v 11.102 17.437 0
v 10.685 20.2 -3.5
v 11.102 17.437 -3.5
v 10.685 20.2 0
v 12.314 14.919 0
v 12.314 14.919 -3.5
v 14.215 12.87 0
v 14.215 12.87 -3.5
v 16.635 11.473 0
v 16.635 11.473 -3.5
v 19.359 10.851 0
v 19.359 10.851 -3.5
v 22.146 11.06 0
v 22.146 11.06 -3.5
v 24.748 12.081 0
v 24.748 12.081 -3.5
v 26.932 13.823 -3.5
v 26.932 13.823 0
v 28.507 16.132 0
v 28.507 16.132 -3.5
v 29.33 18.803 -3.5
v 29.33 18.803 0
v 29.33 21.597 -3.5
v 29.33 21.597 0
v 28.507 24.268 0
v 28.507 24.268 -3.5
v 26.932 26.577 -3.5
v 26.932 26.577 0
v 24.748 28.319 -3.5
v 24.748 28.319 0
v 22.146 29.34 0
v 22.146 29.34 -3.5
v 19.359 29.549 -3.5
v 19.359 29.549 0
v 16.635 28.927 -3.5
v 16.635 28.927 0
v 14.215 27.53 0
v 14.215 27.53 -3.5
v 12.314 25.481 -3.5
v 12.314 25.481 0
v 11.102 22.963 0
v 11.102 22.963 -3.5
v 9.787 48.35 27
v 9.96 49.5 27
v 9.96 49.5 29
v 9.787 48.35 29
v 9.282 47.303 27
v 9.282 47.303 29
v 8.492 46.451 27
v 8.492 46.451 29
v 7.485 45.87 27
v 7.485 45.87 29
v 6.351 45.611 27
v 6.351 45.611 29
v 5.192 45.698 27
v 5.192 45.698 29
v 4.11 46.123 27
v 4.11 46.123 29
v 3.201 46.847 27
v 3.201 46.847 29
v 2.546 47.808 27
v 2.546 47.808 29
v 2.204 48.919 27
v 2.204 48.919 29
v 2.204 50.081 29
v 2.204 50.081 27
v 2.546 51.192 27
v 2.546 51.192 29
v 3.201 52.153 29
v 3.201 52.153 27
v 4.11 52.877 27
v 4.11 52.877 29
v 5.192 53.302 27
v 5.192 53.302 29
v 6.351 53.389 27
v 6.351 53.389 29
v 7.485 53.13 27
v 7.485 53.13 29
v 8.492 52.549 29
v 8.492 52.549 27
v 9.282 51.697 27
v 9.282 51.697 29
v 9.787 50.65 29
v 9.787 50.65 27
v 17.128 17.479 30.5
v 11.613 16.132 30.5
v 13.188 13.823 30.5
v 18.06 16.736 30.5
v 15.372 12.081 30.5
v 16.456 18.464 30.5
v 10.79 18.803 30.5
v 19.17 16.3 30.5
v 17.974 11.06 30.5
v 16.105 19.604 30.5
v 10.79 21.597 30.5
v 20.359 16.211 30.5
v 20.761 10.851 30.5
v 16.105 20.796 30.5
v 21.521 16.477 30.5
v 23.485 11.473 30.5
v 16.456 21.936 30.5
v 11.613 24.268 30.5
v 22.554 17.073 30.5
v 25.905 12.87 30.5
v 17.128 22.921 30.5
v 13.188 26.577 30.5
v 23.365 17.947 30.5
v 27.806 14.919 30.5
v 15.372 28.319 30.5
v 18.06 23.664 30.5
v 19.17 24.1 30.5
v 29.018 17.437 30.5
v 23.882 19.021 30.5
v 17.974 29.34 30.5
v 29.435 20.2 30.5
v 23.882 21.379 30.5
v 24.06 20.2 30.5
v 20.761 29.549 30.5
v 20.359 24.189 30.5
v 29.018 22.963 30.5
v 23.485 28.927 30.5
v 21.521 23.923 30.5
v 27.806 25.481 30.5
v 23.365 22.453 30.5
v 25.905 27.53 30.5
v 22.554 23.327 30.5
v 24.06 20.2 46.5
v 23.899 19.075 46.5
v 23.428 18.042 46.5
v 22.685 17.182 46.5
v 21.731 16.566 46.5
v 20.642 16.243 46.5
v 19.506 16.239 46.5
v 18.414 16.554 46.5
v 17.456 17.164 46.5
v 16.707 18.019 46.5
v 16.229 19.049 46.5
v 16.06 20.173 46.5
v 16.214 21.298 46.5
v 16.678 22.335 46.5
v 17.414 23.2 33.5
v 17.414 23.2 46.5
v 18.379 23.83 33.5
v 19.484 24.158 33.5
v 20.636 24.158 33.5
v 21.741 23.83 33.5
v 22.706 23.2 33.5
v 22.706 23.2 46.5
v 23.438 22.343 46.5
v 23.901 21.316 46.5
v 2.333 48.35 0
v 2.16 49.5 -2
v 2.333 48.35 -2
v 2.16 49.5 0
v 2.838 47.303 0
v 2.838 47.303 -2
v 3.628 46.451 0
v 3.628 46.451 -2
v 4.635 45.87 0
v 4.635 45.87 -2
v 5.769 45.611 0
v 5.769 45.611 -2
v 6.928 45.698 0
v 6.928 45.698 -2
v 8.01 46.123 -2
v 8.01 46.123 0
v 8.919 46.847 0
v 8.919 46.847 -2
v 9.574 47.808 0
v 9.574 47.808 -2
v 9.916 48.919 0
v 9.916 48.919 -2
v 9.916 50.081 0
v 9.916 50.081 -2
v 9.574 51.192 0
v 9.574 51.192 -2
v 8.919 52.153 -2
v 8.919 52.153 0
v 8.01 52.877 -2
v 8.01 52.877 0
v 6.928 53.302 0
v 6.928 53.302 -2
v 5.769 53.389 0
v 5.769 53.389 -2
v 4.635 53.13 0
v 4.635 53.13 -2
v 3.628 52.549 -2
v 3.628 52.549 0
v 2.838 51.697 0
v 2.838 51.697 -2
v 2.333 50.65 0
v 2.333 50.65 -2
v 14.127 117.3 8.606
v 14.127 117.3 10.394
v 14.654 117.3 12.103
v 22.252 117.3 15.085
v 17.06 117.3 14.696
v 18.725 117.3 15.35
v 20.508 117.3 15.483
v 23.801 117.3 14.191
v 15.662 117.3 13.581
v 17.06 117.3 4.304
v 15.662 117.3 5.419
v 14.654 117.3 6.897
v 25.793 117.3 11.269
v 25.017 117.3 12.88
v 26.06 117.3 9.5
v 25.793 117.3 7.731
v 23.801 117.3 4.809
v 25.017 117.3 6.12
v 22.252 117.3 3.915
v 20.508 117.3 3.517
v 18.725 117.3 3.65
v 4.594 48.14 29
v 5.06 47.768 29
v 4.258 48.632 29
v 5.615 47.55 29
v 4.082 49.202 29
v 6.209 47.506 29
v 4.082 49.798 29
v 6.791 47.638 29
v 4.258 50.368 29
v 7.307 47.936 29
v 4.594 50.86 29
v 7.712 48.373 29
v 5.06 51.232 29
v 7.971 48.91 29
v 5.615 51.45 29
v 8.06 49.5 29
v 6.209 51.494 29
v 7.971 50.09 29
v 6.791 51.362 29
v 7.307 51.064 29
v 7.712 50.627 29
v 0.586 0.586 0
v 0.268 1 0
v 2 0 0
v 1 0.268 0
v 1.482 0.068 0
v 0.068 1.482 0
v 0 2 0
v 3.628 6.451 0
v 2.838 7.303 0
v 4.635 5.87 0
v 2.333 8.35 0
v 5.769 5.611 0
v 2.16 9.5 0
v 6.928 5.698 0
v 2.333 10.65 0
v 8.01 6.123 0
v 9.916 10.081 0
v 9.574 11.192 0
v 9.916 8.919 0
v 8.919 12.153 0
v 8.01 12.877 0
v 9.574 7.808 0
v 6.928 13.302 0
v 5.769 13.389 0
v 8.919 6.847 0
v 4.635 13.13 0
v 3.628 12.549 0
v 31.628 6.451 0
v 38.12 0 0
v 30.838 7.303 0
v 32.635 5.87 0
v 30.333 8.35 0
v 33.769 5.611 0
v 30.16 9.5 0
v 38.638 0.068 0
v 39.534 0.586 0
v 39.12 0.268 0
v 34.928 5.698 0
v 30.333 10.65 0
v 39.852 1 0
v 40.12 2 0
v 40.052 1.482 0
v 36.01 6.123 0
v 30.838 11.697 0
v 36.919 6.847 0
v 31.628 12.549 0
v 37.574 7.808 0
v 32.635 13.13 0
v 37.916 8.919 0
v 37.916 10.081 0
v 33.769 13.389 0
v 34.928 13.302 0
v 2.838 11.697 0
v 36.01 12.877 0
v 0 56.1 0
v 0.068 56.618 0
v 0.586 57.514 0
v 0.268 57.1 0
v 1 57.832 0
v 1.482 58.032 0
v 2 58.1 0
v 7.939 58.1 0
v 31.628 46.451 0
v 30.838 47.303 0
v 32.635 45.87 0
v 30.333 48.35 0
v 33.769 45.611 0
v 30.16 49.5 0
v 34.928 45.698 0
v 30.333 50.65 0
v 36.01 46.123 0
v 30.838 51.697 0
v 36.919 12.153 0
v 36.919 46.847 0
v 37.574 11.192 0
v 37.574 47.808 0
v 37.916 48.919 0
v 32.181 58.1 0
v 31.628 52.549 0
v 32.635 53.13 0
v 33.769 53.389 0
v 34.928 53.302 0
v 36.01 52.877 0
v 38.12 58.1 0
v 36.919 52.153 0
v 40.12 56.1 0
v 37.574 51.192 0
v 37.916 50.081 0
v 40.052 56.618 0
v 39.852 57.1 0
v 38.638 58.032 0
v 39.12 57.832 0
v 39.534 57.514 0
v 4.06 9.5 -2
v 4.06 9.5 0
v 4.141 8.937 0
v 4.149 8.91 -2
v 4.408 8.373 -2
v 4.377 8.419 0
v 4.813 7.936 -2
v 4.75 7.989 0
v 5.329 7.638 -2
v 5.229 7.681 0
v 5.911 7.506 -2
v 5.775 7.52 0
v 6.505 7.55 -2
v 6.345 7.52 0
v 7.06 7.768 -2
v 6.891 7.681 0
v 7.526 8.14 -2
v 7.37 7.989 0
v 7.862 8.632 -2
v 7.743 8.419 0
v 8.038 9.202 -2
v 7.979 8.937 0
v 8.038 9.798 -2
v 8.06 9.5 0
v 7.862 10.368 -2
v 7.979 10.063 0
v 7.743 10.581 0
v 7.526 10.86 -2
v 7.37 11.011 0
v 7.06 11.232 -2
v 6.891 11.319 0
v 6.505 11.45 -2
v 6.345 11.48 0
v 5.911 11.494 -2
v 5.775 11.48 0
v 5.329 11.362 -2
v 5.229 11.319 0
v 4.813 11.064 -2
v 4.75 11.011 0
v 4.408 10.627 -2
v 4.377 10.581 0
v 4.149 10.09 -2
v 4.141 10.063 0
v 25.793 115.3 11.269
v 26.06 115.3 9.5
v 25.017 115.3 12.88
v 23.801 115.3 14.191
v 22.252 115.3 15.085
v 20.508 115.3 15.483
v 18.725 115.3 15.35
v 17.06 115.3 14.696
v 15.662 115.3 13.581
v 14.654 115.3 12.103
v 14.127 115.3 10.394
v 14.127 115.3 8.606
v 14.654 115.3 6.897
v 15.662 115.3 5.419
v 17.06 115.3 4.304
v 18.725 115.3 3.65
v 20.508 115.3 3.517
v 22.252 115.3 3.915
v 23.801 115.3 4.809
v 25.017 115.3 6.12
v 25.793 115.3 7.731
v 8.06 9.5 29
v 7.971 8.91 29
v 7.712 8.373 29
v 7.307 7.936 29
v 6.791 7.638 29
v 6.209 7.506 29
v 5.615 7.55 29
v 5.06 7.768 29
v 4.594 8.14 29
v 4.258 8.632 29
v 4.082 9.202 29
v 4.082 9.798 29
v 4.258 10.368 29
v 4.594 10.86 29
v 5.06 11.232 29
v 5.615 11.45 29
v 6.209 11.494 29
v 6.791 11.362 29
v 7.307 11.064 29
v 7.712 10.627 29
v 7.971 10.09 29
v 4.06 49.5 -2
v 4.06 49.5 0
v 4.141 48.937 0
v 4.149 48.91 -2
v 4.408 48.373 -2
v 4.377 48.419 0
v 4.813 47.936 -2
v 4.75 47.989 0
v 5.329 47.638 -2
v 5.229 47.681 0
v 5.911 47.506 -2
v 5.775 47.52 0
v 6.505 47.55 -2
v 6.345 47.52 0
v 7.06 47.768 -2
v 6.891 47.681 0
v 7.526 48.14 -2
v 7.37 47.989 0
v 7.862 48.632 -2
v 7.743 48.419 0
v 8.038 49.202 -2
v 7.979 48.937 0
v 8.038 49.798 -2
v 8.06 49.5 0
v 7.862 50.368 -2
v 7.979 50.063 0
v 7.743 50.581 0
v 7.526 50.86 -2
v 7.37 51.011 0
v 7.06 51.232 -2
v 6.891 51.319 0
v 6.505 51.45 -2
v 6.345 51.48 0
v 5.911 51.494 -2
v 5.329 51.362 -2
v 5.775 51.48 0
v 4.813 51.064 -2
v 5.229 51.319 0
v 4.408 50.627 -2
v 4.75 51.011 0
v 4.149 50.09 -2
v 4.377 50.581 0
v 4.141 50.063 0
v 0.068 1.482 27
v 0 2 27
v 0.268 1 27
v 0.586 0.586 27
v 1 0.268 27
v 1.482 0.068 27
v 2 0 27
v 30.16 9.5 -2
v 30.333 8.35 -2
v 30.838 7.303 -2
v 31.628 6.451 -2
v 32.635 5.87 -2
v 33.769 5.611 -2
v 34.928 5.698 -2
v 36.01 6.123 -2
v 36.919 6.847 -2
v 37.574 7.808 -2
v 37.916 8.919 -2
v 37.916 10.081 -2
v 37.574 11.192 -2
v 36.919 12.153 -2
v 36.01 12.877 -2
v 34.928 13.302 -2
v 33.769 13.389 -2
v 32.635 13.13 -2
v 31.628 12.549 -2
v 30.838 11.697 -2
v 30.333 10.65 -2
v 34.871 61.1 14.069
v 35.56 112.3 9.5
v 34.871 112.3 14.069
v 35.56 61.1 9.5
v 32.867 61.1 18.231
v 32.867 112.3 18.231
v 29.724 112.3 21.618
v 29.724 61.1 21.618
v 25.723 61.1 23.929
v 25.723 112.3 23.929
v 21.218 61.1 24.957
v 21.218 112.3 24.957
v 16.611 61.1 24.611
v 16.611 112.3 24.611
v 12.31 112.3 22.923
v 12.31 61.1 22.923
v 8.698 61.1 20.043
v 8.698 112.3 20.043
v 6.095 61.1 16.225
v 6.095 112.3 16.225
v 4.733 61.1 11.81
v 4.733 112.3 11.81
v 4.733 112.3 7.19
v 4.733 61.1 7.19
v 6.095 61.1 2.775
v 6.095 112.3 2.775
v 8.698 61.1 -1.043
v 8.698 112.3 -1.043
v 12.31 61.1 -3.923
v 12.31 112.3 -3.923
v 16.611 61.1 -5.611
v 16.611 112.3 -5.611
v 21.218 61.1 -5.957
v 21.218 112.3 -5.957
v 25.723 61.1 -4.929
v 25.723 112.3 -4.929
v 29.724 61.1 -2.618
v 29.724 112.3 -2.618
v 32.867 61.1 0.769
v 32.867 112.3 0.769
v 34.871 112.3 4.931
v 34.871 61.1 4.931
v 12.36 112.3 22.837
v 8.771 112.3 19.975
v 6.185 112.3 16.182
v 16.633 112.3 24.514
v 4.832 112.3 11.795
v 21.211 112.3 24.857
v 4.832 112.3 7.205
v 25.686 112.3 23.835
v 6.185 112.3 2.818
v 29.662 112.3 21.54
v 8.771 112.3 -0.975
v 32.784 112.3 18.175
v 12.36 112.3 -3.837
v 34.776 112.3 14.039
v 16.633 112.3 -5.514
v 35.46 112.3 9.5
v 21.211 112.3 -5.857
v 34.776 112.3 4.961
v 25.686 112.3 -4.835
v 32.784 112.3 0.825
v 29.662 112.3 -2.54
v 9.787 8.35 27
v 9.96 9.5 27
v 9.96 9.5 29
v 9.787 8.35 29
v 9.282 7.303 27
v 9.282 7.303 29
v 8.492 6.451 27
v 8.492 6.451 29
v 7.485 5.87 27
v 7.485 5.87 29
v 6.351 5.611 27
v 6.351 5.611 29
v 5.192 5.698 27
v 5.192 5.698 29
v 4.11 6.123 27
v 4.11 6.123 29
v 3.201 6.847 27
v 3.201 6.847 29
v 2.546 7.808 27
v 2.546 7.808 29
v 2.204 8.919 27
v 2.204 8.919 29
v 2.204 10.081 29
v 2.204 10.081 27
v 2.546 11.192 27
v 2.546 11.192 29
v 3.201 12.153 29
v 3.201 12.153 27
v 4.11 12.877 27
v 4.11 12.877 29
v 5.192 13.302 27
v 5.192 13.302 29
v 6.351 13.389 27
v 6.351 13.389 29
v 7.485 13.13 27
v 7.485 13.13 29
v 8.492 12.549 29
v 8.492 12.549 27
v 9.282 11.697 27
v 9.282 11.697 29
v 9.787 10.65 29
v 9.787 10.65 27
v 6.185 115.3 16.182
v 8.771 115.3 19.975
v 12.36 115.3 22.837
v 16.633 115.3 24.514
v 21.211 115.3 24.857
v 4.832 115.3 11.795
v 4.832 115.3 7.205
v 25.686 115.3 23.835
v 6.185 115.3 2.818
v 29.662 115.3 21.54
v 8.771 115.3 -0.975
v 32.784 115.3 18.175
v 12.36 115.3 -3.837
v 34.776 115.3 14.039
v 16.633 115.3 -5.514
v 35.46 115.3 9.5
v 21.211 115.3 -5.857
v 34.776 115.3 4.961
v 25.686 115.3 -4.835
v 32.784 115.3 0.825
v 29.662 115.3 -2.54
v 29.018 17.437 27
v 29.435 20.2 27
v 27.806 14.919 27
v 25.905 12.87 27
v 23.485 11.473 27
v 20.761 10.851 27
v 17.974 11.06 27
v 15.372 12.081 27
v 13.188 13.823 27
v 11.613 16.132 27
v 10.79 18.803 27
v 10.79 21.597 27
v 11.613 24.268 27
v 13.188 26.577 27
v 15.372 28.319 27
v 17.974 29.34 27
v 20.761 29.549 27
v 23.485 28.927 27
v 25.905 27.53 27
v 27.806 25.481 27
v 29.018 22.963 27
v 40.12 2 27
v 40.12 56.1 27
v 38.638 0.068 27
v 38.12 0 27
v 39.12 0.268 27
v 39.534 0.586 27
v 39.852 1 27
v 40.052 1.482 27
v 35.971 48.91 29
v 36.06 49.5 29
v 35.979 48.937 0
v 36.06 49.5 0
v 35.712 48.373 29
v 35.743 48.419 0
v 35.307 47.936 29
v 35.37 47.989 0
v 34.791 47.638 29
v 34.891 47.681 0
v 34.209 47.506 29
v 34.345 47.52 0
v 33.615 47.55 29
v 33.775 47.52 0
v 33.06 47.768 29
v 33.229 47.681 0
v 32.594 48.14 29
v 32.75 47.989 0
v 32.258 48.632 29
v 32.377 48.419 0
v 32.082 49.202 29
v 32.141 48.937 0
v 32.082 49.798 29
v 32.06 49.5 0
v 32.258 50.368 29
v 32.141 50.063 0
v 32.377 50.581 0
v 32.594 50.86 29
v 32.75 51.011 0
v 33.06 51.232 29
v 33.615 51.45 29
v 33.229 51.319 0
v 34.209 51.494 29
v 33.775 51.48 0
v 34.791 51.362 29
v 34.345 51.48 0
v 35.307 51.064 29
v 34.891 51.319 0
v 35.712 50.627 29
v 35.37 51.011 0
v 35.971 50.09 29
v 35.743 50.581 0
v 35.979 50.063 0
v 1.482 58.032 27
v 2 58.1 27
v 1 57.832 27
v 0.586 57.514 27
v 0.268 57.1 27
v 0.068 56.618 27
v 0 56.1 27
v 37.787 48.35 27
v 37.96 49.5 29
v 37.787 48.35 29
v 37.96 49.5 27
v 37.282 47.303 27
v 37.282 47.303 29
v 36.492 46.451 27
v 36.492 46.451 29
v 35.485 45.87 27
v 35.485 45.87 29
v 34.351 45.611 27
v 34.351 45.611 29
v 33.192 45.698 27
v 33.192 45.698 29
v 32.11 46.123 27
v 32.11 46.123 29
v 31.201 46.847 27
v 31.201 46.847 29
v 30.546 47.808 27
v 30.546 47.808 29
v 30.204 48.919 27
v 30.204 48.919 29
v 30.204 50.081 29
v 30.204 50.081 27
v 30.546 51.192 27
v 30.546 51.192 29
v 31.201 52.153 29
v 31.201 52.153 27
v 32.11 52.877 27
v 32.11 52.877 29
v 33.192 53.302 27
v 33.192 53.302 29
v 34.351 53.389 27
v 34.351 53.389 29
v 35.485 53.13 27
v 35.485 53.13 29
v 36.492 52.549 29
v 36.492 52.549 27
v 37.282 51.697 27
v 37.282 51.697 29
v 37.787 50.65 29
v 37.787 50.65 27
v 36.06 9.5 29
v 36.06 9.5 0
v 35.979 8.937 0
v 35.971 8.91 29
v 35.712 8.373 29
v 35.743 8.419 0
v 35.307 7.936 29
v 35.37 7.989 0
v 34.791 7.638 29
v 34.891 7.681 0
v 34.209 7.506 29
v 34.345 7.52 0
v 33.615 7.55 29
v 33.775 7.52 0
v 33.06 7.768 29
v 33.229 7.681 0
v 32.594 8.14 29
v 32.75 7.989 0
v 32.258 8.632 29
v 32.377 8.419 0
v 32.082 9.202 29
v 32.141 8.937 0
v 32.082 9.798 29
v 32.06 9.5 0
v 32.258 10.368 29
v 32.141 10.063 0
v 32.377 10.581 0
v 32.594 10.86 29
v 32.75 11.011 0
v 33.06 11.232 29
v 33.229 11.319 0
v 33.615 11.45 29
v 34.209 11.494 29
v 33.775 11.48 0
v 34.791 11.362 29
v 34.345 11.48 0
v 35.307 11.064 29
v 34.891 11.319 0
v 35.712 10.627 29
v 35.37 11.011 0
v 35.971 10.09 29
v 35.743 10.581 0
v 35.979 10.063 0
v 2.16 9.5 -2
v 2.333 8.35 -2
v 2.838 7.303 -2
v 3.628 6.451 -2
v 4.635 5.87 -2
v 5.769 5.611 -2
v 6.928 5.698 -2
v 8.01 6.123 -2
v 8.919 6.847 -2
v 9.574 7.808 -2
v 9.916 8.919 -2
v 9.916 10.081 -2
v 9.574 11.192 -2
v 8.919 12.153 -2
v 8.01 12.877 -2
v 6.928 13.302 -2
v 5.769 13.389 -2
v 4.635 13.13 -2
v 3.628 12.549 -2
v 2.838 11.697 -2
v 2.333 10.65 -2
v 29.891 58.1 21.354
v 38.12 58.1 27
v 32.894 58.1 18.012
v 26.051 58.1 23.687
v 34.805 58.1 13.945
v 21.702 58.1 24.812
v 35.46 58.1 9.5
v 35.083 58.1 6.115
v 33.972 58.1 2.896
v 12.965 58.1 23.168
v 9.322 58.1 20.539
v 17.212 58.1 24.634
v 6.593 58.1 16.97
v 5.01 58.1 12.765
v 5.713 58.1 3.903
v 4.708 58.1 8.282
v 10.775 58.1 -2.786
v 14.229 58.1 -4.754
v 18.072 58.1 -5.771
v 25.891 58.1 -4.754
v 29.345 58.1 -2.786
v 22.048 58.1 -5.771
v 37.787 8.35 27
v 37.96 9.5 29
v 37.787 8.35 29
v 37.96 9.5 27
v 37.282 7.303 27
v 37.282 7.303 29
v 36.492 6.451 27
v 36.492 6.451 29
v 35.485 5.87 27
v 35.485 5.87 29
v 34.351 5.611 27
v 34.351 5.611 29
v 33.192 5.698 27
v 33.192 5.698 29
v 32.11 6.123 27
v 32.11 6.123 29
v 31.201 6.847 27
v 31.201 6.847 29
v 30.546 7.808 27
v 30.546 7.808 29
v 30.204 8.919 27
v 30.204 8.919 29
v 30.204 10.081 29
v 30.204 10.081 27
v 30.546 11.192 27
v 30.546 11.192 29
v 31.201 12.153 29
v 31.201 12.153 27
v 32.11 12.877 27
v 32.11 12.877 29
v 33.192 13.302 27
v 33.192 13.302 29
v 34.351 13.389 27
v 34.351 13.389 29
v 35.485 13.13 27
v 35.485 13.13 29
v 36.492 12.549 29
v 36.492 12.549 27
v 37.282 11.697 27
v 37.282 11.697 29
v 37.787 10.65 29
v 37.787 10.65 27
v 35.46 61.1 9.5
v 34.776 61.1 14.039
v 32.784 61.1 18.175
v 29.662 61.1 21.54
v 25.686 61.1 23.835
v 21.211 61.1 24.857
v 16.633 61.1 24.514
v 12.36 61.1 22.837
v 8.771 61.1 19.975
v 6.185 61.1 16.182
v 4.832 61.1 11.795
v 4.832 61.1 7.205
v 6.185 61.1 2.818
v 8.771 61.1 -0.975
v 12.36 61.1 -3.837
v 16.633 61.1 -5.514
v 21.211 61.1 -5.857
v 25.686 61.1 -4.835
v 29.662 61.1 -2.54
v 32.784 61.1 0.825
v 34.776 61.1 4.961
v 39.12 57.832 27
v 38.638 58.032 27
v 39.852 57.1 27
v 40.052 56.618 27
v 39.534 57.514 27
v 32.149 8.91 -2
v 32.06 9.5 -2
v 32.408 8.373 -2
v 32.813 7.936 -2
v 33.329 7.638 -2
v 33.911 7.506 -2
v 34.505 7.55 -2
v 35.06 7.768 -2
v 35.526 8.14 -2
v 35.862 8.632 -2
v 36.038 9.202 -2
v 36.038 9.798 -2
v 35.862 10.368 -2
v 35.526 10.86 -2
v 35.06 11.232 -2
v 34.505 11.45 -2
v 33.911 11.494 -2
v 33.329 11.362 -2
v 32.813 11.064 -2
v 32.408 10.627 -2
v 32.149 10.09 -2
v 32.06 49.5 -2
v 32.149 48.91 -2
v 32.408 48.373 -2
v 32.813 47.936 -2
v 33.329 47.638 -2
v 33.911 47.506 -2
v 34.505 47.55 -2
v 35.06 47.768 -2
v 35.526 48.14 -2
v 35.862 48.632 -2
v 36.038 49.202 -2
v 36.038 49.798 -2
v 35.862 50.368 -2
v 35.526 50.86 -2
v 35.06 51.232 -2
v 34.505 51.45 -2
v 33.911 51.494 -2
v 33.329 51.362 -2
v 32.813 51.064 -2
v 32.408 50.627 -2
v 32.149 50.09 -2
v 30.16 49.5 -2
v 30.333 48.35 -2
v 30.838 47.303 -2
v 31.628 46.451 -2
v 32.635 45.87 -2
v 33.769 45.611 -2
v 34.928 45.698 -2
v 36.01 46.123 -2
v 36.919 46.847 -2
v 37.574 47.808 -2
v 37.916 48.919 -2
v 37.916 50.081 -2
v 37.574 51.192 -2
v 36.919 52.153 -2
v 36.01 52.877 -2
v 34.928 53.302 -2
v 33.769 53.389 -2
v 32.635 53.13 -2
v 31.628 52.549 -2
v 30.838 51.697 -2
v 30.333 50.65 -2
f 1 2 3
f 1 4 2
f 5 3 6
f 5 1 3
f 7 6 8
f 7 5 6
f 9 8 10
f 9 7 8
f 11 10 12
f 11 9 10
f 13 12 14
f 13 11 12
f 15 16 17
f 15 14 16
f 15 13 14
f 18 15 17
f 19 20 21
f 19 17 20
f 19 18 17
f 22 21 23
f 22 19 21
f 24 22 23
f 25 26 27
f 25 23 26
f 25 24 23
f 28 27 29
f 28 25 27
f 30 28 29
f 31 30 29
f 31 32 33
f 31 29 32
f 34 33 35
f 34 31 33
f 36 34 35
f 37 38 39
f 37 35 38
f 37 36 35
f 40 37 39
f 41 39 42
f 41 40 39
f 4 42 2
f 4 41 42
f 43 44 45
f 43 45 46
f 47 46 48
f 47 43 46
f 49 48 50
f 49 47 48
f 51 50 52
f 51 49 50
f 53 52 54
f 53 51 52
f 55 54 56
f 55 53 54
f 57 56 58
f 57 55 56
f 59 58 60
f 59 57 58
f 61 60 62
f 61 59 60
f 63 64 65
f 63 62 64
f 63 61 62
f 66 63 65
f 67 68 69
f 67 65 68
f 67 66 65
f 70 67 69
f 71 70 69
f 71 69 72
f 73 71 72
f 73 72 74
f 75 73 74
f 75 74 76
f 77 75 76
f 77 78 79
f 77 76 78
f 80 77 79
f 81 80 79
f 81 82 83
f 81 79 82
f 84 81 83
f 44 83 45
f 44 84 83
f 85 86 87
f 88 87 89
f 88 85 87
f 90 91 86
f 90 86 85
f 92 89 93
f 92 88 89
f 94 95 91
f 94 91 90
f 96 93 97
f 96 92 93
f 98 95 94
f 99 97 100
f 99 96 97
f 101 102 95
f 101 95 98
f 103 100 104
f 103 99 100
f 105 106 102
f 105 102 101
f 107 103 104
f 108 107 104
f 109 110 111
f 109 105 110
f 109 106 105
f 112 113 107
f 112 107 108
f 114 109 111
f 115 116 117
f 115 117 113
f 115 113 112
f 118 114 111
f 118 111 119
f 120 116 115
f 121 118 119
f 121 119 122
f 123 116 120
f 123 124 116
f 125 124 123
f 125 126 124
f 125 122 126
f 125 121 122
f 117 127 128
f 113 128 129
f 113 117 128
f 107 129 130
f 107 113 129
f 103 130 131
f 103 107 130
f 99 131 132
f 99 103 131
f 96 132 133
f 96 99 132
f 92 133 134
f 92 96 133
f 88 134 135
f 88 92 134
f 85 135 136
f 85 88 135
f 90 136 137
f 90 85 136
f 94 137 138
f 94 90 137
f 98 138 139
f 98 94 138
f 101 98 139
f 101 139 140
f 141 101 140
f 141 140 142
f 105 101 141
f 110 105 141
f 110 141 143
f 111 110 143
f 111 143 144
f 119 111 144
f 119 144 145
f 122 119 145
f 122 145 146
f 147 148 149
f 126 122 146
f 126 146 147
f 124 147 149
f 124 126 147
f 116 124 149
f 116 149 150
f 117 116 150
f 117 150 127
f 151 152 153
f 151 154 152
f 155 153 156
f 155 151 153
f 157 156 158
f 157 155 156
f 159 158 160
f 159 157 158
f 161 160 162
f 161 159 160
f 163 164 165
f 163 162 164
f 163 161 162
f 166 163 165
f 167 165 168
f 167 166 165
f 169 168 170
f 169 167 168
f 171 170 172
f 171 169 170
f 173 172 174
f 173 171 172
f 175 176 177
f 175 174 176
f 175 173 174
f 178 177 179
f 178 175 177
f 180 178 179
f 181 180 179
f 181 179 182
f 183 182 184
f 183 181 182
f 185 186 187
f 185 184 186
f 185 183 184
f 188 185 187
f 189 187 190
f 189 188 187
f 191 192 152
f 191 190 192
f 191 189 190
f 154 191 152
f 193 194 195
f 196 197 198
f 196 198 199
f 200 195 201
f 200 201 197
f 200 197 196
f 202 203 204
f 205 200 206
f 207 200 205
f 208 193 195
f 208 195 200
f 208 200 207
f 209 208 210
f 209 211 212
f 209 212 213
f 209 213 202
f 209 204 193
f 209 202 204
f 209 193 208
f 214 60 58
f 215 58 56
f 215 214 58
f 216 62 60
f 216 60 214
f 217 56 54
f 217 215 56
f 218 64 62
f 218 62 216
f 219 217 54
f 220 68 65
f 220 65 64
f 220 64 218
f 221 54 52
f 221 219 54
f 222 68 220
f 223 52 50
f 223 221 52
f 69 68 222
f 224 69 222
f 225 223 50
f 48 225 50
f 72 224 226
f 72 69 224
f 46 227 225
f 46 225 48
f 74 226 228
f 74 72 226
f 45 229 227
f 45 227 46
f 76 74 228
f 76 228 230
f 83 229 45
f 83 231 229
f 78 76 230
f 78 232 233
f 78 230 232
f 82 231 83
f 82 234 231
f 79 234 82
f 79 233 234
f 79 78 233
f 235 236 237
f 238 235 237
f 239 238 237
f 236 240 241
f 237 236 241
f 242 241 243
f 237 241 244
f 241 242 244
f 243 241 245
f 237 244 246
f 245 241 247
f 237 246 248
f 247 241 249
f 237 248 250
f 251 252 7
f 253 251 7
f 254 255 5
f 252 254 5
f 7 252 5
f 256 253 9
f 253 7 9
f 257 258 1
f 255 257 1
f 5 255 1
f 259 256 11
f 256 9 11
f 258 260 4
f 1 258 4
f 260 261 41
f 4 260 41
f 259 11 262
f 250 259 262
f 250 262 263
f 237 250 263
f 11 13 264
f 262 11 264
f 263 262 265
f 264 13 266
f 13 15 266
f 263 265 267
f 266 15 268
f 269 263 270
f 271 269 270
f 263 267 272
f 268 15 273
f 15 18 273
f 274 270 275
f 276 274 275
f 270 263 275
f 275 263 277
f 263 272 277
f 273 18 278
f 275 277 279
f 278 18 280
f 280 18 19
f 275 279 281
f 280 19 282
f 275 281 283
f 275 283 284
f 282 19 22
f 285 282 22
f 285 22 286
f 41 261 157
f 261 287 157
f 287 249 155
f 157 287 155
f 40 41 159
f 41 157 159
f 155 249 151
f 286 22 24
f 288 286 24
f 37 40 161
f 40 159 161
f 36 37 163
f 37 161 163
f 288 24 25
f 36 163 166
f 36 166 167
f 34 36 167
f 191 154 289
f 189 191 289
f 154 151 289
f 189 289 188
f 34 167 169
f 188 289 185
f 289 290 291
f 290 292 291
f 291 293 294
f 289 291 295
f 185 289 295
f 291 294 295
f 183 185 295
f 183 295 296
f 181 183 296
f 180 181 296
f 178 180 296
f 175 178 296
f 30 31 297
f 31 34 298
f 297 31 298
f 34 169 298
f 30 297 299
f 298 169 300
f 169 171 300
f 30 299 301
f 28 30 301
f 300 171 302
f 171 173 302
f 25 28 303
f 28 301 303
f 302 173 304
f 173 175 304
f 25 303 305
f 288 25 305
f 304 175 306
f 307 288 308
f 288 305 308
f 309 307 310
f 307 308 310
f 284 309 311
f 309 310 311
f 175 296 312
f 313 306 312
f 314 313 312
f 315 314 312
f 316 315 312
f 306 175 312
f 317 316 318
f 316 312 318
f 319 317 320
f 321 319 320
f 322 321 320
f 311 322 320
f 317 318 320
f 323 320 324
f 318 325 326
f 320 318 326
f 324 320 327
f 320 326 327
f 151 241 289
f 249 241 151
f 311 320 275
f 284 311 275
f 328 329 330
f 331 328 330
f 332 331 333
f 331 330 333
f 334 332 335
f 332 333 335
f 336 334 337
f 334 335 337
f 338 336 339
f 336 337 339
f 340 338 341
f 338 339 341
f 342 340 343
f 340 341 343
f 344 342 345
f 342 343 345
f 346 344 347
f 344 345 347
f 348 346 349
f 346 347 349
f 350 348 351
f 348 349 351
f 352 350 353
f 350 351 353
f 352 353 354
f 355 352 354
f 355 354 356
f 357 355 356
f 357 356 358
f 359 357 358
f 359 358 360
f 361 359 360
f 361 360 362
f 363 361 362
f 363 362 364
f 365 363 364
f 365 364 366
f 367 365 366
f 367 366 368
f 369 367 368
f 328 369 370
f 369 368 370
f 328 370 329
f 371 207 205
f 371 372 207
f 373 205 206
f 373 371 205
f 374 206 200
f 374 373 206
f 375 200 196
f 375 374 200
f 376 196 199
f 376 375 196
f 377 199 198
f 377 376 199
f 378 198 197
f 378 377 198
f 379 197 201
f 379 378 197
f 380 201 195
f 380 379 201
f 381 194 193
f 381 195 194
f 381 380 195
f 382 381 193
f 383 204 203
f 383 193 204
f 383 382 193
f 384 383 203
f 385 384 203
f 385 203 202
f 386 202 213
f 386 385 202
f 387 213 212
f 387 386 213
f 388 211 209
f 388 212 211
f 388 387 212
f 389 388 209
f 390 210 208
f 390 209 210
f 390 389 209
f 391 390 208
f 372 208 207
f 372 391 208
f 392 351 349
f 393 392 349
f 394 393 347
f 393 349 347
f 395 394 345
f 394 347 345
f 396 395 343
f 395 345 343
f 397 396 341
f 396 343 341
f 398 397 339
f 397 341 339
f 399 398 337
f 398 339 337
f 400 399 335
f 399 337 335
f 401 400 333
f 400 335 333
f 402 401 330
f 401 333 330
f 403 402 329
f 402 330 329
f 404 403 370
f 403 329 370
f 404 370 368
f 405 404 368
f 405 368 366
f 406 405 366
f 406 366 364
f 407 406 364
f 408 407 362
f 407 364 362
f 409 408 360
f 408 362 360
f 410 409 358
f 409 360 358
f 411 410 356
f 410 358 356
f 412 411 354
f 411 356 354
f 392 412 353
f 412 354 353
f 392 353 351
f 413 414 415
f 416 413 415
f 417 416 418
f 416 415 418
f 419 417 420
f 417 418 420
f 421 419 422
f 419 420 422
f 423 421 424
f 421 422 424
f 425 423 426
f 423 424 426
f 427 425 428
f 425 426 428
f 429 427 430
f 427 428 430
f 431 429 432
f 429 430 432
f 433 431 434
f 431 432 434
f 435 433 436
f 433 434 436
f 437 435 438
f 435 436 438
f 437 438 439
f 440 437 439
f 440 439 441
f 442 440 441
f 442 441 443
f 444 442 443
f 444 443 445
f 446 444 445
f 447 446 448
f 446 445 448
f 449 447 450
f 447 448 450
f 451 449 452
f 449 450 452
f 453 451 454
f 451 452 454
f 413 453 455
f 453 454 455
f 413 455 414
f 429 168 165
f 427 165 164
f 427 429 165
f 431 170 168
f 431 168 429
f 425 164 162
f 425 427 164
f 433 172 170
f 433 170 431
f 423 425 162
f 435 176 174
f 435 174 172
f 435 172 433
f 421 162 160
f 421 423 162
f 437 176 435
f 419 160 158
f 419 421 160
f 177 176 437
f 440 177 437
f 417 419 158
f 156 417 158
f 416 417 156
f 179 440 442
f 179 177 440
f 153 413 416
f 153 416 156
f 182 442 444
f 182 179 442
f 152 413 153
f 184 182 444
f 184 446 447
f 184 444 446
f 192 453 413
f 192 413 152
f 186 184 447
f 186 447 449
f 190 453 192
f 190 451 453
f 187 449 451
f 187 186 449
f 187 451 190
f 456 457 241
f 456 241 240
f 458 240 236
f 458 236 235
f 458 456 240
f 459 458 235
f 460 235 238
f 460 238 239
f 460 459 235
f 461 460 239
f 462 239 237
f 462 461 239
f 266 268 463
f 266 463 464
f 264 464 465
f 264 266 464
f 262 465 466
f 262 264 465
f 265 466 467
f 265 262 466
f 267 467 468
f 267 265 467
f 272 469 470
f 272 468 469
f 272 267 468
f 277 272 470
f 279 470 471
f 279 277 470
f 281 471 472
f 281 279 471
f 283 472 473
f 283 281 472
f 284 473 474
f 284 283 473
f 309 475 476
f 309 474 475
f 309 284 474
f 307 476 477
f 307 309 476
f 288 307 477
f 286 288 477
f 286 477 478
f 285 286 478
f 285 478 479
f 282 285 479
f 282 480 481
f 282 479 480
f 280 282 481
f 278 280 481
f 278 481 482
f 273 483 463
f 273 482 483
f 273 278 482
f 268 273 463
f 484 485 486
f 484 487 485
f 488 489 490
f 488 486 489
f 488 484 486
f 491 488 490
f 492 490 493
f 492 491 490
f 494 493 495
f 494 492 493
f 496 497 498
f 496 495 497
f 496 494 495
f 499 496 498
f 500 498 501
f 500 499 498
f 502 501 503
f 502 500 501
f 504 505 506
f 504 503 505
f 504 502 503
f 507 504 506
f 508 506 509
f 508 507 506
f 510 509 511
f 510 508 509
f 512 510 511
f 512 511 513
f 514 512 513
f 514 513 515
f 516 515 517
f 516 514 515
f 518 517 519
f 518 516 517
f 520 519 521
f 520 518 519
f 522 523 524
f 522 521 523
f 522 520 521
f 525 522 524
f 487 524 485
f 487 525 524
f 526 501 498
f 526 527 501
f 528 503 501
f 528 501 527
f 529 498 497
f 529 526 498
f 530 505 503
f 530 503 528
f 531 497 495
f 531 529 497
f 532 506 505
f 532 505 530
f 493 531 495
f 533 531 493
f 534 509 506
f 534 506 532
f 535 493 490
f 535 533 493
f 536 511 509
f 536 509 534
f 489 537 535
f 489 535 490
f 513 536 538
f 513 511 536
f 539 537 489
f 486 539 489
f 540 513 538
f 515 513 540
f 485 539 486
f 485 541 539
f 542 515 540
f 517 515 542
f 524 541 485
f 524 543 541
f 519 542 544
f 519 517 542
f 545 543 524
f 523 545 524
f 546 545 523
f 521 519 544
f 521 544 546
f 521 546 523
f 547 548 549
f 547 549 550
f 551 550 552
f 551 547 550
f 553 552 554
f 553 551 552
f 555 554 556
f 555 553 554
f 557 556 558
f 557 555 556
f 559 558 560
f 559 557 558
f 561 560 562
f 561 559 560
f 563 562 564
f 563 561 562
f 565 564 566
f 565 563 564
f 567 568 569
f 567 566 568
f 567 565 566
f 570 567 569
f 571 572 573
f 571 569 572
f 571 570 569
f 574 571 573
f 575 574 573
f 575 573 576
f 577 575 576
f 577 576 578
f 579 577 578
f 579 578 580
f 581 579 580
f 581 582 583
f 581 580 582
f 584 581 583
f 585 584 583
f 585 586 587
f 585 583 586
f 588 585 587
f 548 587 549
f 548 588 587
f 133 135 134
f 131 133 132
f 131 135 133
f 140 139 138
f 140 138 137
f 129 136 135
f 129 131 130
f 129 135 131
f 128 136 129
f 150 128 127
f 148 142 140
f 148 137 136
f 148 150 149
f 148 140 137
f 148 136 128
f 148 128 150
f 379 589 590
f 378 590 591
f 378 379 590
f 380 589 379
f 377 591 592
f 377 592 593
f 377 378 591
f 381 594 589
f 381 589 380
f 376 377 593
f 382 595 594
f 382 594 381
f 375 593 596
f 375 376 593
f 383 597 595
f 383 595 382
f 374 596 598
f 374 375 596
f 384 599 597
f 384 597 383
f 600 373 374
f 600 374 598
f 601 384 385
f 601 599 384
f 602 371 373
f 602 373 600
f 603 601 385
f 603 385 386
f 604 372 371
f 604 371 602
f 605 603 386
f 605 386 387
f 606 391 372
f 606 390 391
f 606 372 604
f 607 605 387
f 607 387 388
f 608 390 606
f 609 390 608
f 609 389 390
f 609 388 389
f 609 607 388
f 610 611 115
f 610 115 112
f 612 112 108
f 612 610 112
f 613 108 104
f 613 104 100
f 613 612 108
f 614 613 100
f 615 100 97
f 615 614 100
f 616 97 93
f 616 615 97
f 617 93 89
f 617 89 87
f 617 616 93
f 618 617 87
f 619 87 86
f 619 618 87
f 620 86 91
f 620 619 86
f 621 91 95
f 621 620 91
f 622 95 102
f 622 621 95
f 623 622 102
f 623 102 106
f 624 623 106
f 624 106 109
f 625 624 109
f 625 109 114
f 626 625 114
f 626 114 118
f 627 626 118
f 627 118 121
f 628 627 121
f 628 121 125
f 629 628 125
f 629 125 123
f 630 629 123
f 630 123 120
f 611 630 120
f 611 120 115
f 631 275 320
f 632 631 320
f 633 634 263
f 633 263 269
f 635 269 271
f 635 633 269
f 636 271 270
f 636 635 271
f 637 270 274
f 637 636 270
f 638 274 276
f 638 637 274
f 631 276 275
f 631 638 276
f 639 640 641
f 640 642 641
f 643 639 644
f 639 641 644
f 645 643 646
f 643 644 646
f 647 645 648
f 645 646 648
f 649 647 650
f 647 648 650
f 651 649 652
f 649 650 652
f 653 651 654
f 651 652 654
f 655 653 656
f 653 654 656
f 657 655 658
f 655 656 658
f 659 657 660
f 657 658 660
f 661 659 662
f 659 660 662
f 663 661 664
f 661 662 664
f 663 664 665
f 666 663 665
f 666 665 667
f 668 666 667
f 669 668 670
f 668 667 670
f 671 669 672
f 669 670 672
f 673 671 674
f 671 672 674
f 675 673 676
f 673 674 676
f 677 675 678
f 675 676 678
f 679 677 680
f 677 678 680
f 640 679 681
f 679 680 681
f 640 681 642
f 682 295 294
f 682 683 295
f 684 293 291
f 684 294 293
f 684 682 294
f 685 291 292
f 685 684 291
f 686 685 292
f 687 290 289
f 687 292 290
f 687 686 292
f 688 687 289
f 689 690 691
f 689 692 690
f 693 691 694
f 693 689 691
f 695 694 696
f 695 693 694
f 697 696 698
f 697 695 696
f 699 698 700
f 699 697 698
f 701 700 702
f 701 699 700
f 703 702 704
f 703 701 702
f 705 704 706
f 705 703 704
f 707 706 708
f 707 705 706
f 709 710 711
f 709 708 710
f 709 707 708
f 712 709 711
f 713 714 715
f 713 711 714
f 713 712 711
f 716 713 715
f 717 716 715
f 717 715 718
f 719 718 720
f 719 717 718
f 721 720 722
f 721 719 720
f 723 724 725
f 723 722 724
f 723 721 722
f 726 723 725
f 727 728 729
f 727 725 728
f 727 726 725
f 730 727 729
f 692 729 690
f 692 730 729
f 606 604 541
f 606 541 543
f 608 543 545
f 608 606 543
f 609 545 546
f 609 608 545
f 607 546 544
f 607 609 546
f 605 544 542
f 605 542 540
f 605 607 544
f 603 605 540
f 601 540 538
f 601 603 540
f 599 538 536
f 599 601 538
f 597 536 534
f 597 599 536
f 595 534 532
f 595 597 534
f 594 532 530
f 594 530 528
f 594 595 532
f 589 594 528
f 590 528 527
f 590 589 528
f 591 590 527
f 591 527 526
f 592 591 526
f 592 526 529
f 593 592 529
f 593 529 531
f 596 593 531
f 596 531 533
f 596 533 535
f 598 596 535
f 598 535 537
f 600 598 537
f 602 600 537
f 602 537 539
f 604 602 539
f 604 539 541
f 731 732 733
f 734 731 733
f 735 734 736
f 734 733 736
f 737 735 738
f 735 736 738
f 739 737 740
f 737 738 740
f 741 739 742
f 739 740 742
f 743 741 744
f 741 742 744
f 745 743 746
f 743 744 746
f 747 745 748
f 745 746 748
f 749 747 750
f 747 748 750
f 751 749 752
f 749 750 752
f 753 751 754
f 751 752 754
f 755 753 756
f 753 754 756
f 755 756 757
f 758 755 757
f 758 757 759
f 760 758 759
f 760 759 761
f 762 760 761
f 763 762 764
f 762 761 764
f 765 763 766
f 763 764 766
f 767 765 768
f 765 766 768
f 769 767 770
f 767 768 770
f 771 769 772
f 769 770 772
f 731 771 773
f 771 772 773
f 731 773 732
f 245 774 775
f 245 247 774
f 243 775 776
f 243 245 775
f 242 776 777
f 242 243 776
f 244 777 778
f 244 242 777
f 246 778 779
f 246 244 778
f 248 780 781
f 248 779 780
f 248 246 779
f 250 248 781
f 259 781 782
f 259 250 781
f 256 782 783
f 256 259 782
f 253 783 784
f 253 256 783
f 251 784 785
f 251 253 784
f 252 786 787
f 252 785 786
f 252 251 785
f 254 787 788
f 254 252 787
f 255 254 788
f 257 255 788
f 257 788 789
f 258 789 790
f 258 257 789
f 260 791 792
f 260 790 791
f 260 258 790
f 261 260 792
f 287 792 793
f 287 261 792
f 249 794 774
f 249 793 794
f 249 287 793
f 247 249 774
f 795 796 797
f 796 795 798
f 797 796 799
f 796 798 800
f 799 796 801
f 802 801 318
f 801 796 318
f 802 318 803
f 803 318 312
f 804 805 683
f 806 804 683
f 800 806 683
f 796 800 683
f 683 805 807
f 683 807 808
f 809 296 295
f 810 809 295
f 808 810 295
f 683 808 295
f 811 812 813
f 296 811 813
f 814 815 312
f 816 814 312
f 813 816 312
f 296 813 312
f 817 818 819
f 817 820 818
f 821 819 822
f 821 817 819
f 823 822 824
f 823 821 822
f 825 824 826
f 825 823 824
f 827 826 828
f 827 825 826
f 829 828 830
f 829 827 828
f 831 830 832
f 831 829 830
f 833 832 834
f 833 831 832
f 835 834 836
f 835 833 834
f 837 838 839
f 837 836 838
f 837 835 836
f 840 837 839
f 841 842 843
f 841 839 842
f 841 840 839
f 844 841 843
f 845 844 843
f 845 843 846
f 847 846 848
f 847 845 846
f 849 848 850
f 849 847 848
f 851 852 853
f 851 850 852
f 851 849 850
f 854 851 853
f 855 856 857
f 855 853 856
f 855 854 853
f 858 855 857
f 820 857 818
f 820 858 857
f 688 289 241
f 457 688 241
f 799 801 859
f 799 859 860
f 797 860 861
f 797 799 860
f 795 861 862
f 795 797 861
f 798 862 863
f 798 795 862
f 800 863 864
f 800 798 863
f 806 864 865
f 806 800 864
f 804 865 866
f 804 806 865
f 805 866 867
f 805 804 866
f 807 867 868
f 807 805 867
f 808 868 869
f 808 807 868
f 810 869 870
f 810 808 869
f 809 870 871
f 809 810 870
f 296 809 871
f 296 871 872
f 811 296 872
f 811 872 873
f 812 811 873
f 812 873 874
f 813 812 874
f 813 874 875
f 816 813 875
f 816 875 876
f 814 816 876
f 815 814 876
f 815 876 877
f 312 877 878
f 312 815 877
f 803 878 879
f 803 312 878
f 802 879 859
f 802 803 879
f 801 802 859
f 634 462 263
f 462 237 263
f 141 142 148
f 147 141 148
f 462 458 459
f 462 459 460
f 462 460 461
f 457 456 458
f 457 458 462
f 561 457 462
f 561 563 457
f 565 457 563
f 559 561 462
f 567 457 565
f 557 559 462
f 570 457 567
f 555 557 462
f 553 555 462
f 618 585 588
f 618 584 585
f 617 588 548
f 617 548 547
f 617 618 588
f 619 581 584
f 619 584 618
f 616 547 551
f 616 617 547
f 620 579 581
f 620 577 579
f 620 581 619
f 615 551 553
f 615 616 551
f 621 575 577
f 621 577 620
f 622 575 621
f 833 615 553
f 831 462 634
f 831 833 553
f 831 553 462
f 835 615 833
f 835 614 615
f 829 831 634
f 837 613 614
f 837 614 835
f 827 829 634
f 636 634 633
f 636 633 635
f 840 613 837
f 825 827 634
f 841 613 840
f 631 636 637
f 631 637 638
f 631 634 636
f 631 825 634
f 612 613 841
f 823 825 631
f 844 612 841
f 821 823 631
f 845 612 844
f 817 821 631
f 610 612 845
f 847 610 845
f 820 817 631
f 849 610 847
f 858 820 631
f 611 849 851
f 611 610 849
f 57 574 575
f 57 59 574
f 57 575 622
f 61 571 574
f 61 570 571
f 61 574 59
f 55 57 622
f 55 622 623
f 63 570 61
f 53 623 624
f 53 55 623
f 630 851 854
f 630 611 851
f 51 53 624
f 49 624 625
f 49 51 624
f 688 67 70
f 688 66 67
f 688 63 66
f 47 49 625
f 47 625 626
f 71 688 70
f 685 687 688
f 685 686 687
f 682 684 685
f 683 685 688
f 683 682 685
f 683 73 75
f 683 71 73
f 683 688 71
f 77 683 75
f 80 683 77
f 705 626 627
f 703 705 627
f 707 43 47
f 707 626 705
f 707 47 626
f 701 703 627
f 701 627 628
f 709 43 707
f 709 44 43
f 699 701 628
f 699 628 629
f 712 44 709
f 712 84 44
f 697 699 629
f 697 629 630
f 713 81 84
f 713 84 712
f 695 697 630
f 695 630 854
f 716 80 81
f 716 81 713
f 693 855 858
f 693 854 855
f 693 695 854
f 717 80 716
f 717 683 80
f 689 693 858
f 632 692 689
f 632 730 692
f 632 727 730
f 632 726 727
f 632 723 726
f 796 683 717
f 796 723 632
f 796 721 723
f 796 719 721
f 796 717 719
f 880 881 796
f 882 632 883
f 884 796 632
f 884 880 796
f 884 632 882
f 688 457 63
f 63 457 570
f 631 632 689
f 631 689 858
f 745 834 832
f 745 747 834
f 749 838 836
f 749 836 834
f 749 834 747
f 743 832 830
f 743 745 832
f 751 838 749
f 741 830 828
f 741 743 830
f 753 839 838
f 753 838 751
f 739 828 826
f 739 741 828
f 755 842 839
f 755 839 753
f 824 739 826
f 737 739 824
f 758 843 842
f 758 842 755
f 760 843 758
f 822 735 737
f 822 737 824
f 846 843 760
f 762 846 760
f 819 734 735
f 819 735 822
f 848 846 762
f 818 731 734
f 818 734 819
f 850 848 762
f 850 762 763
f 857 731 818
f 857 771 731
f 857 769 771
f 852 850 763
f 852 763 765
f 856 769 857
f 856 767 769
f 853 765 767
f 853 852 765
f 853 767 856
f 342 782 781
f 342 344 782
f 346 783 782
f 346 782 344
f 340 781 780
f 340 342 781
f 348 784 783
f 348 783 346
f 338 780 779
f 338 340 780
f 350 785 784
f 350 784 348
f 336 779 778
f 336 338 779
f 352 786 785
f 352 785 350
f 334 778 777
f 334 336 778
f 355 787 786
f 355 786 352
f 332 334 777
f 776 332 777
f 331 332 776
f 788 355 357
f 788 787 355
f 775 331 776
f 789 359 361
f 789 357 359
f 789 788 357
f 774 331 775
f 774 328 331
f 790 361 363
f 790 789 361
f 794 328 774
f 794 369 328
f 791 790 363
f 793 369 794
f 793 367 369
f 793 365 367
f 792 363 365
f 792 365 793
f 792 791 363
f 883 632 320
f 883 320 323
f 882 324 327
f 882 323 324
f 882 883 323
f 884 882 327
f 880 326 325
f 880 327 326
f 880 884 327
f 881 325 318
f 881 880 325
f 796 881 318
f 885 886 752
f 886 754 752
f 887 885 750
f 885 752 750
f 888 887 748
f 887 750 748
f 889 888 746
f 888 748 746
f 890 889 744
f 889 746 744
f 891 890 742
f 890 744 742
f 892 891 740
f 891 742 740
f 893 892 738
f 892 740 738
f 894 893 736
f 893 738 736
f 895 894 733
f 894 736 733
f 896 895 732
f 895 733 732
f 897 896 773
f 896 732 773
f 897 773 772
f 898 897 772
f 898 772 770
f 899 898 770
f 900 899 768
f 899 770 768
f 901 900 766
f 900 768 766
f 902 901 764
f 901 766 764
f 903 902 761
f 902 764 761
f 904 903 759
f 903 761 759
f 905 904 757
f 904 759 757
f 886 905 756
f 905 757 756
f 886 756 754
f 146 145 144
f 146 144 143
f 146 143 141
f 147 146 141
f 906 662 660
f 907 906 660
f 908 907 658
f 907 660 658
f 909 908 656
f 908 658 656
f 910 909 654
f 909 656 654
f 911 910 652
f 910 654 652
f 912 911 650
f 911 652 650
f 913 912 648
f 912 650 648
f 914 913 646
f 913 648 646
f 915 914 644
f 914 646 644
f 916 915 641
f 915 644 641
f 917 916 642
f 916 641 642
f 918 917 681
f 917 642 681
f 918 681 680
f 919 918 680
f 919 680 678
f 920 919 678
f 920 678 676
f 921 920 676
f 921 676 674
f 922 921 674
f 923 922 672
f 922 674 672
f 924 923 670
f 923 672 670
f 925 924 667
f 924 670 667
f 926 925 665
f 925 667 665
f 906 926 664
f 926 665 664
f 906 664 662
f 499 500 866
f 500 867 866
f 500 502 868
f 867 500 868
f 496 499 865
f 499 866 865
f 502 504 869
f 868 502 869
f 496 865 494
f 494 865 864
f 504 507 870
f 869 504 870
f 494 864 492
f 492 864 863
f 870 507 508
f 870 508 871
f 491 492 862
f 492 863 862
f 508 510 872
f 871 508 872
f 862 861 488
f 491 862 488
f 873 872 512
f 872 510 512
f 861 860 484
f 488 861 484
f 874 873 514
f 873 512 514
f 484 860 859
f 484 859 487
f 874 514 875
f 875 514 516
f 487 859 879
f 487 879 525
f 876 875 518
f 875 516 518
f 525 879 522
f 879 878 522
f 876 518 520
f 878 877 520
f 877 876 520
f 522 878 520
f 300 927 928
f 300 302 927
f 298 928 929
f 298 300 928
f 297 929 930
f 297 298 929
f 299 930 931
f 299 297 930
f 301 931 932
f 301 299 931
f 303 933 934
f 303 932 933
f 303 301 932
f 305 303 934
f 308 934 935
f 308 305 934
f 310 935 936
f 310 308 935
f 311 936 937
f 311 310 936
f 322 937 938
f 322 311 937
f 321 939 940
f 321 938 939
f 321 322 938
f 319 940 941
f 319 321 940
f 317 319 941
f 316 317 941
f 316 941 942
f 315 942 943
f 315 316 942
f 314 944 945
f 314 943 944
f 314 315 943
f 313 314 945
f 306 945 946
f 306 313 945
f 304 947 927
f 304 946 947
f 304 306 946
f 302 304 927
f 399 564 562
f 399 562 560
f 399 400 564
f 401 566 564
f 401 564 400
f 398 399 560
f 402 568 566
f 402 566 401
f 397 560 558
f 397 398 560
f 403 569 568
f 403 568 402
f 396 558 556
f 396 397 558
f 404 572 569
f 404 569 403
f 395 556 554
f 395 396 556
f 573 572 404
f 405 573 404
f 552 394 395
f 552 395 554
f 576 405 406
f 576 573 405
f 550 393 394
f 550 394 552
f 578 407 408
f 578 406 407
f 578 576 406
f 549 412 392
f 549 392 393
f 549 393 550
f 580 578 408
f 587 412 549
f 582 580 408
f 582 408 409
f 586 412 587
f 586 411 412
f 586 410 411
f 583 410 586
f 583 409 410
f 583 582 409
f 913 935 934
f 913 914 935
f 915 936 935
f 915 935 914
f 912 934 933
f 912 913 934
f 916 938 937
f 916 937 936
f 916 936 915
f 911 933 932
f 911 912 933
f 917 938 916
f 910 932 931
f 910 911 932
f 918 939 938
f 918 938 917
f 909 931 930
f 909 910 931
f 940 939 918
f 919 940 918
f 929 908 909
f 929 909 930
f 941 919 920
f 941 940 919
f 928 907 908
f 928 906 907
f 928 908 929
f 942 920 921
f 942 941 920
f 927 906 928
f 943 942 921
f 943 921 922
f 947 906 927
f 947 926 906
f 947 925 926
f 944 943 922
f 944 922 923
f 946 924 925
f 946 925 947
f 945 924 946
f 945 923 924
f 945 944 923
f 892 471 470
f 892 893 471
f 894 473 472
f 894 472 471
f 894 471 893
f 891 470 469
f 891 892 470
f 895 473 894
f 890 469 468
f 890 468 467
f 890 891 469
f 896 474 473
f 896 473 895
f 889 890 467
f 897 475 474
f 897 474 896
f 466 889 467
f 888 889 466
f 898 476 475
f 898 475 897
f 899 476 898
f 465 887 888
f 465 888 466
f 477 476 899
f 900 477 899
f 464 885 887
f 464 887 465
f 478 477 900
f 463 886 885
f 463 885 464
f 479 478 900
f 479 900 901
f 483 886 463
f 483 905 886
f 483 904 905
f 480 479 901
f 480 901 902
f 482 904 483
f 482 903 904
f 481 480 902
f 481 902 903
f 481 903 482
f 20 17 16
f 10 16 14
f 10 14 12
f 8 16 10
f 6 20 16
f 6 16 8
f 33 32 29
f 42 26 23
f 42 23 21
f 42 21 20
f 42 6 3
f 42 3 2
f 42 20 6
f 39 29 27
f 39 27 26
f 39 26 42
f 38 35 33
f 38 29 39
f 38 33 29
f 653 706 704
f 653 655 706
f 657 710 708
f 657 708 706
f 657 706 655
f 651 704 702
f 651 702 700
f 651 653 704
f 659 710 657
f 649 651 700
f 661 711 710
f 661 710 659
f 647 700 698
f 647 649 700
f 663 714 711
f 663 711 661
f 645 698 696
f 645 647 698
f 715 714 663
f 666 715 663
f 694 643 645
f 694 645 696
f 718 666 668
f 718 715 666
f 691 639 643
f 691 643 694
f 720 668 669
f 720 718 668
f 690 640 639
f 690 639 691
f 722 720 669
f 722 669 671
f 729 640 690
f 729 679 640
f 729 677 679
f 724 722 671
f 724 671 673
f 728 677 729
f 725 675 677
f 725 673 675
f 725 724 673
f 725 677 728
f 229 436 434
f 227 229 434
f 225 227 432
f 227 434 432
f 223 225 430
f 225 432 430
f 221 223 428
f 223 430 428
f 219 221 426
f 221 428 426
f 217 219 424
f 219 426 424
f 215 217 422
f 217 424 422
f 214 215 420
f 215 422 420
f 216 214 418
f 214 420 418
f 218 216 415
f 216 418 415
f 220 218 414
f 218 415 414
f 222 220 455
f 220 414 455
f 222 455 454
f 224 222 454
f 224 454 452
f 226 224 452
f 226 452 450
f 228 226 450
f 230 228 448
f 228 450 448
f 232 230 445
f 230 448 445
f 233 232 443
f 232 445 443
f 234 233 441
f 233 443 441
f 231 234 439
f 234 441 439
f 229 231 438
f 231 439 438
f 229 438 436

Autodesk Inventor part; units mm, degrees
ref_plane "YZ Plane" through (0, 0, 0) normal (1, 0, 0) x (0, 1, 0)
ref_plane "XZ Plane" through (0, 0, 0) normal (0, 1, 0) x (-1, 0, 0)
ref_plane "XY Plane" through (0, 0, 0) normal (0, 0, 1) x (1, 0, 0)
sketch "Sketch1" plane through (0, 0, 0) normal (0, 0, 1) x (1, 0, 0)
  line L0 (0, 0) -> (40.12, 0)
  line L1 (40.12, 0) -> (40.12, 58.1)
  line L2 (40.12, 58.1) -> (0, 58.1)
  line L3 (0, 58.1) -> (0, 0)
  circle A0 centre (20.06, 20.2) radius 4
  line L4 (6.06, 49.5) -> (34.06, 49.5) construction
  line L5 (34.06, 49.5) -> (34.06, 9.5) construction
  line L6 (34.06, 9.5) -> (6.06, 9.5) construction
  line L7 (6.06, 9.5) -> (6.06, 49.5) construction
  circle A1 centre (6.06, 49.5) radius 2
  circle A2 centre (34.06, 49.5) radius 2
  circle A3 centre (34.06, 9.5) radius 2
  circle A4 centre (6.06, 9.5) radius 2
  point P0 (20.06, 58.1)
  point P1 (20.06, 49.5)
  dimension "d0" = 40.12
  dimension "d1" = 58.1
  dimension "d2" = 8
  dimension "d3" = 37.9
  dimension "d4" = 28
  dimension "d5" = 40
  dimension "d6" = 8.6
  dimension "d7" = 4
  dimension "d8" = 4
  dimension "d9" = 4
  dimension "d10" = 4
extrude "Extrusion1" add sketch "Sketch1" along normal blind 27
sketch "Sketch2" plane through (0, 0, 27) normal (0, 0, 1) x (1, 0, 0)
  circle A0 centre (6.06, 49.5) radius 2 projected
  circle A1 centre (34.06, 49.5) radius 2 projected
  circle A2 centre (20.06, 20.2) radius 4 projected
  circle A3 centre (34.06, 9.5) radius 2 projected
  circle A4 centre (6.06, 9.5) radius 2 projected
  circle A5 centre (6.06, 49.5) radius 2 projected
  circle A6 centre (6.06, 49.5) radius 3.9
  circle A7 centre (34.06, 9.5) radius 2 projected
  circle A8 centre (34.06, 9.5) radius 3.9
  circle A9 centre (34.06, 49.5) radius 2 projected
  circle A10 centre (34.06, 49.5) radius 3.9
  circle A11 centre (6.06, 9.5) radius 3.9
  circle A12 centre (20.06, 20.2) radius 9.375
  point P0 (0, 0)
  dimension "d13" = 7.8
  dimension "d14" = 7.8
  dimension "d15" = 7.8
  dimension "d16" = 7.8
  dimension "d17" = 18.75
extrude "Extrusion2" add sketch "Sketch2" along normal blind 2
sketch "Sketch3" plane through (0, 0, 27) normal (0, 0, 1) x (1, 0, 0)
  circle A0 centre (20.06, 20.2) radius 9.375 projected
  circle A1 centre (20.06, 20.2) radius 4 projected
  point P0 (0, 0)
extrude "Extrusion3" add sketch "Sketch3" along normal blind 3.5
sketch "Sketch4" plane through (0, 0, 0) normal (0, 0, -1) x (-1, 0, 0)
  circle A0 centre (-20.06, 20.2) radius 9.375 projected
  circle A1 centre (-20.06, 20.2) radius 4 projected
  point P0 (0, 0)
extrude "Extrusion4" add sketch "Sketch4" along normal blind 3.5
sketch "Sketch5" plane through (20.06, 20.2, -3.5) normal (0, 0, -1) x (-1, 0, 0)
  circle A0 centre (0, 0) radius 9.375 projected
  point P0 (20.06, -20.2)
extrude "Extrusion5" add sketch "Sketch5" against normal up to surface (34 mm away) from surface at 0
sketch "Sketch6" plane through (20.06, 20.2, 30.5) normal (0, 0, 1) x (1, 0, 0)
  circle A0 centre (0, 0) radius 4
  circle A1 centre (0, 0) radius 9.375 projected
  point P0 (-20.06, -20.2)
  dimension "d26" = 8
extrude "Extrusion6" add sketch "Sketch6" along normal blind 16 contours A0
sketch "Sketch7" plane through (20.06, 20.2, 46.5) normal (0, 0, 1) x (1, 0, 0)
  line L0 (-2.6458, 3) -> (2.6458, 3)
  circle A0 centre (0, 0) radius 4 projected
  arc A1 (-2.6458, 3) -> (2.6458, 3) centre (0, 0) ccw
  point P0 (-20.06, -20.2)
  point P1 (0, 3)
  dimension "d29" = 7
extrude "Extrusion7" cut sketch "Sketch7" against normal blind 13 contours A0 L0 picked at (0.5822, 3.4764)
sketch "Sketch8" plane through (0, 58.1, 0) normal (0, 1, 0) x (1, 0, 0)
  circle A0 centre (20.06, -9.5) radius 15.5
  line L0 (40.12, -27) -> (0, -27) projected
  line L1 (40.12, 0) -> (40.12, -27) projected
  line L2 (40.12, -13.5) -> (0, -13.5)
  point P0 (0, 0)
  point P1 (20.06, -27)
  point P2 (20.06, -13.5)
  dimension "d32" = 31
  dimension "d34" = 4
extrude "Extrusion8" add sketch "Sketch8" along normal blind 57.2
sketch "Sketch10" plane through (20.06, 115.3, 9.5) normal (0, 1, 0) x (1, 0, 0)
  circle A0 centre (0, 0) radius 6
  circle A1 centre (0, 0) radius 15.5 projected
  point P0 (-20.06, 9.5)
  dimension "d37" = 12
extrude "Extrusion9" add sketch "Sketch10" along normal blind 2 contours A0
sketch "Sketch11" plane through (20.06, 115.3, 9.5) normal (0, 1, 0) x (1, 0, 0)
  circle A0 centre (0, 0) radius 15.5 projected
  circle A1 centre (0, 0) radius 15.4
  point P0 (-20.06, 9.5)
  dimension "d40" = 0.1
extrude "Extrusion10" cut sketch "Sketch11" against normal blind 3
sketch "Sketch12" plane through (0, 58.1, 27) normal (0, 1, 0) x (1, 0, 0)
  circle A0 centre (20.06, 17.5) radius 15.4 projected
  circle A1 centre (20.06, 17.5) radius 15.5 projected
  point P0 (0, 27)
extrude "Extrusion11" cut sketch "Sketch12" along normal blind 3
sketch "Sketch13" plane through (0, 0, 0) normal (0, 0, -1) x (-1, 0, 0)
  circle A0 centre (-6.06, 49.5) radius 3.9 projected
  circle A1 centre (-34.06, 49.5) radius 3.9 projected
  circle A2 centre (-34.06, 9.5) radius 3.9 projected
  circle A3 centre (-6.06, 9.5) radius 3.9 projected
  circle A4 centre (-6.06, 9.5) radius 2 projected
  circle A5 centre (-6.06, 49.5) radius 2 projected
  circle A6 centre (-34.06, 49.5) radius 2 projected
  circle A7 centre (-34.06, 9.5) radius 2 projected
  point P0 (0, 0)
extrude "Extrusion12" add sketch "Sketch13" along normal blind 2
fillet "Fillet1" radius 2 4 edges at (40.12, 58.1, 13.5) (0, 58.1, 13.5) (0, 0, 13.5) (40.12, 0, 13.5)
properties part number "TS-40GZ495" material "Stainless Steel"
